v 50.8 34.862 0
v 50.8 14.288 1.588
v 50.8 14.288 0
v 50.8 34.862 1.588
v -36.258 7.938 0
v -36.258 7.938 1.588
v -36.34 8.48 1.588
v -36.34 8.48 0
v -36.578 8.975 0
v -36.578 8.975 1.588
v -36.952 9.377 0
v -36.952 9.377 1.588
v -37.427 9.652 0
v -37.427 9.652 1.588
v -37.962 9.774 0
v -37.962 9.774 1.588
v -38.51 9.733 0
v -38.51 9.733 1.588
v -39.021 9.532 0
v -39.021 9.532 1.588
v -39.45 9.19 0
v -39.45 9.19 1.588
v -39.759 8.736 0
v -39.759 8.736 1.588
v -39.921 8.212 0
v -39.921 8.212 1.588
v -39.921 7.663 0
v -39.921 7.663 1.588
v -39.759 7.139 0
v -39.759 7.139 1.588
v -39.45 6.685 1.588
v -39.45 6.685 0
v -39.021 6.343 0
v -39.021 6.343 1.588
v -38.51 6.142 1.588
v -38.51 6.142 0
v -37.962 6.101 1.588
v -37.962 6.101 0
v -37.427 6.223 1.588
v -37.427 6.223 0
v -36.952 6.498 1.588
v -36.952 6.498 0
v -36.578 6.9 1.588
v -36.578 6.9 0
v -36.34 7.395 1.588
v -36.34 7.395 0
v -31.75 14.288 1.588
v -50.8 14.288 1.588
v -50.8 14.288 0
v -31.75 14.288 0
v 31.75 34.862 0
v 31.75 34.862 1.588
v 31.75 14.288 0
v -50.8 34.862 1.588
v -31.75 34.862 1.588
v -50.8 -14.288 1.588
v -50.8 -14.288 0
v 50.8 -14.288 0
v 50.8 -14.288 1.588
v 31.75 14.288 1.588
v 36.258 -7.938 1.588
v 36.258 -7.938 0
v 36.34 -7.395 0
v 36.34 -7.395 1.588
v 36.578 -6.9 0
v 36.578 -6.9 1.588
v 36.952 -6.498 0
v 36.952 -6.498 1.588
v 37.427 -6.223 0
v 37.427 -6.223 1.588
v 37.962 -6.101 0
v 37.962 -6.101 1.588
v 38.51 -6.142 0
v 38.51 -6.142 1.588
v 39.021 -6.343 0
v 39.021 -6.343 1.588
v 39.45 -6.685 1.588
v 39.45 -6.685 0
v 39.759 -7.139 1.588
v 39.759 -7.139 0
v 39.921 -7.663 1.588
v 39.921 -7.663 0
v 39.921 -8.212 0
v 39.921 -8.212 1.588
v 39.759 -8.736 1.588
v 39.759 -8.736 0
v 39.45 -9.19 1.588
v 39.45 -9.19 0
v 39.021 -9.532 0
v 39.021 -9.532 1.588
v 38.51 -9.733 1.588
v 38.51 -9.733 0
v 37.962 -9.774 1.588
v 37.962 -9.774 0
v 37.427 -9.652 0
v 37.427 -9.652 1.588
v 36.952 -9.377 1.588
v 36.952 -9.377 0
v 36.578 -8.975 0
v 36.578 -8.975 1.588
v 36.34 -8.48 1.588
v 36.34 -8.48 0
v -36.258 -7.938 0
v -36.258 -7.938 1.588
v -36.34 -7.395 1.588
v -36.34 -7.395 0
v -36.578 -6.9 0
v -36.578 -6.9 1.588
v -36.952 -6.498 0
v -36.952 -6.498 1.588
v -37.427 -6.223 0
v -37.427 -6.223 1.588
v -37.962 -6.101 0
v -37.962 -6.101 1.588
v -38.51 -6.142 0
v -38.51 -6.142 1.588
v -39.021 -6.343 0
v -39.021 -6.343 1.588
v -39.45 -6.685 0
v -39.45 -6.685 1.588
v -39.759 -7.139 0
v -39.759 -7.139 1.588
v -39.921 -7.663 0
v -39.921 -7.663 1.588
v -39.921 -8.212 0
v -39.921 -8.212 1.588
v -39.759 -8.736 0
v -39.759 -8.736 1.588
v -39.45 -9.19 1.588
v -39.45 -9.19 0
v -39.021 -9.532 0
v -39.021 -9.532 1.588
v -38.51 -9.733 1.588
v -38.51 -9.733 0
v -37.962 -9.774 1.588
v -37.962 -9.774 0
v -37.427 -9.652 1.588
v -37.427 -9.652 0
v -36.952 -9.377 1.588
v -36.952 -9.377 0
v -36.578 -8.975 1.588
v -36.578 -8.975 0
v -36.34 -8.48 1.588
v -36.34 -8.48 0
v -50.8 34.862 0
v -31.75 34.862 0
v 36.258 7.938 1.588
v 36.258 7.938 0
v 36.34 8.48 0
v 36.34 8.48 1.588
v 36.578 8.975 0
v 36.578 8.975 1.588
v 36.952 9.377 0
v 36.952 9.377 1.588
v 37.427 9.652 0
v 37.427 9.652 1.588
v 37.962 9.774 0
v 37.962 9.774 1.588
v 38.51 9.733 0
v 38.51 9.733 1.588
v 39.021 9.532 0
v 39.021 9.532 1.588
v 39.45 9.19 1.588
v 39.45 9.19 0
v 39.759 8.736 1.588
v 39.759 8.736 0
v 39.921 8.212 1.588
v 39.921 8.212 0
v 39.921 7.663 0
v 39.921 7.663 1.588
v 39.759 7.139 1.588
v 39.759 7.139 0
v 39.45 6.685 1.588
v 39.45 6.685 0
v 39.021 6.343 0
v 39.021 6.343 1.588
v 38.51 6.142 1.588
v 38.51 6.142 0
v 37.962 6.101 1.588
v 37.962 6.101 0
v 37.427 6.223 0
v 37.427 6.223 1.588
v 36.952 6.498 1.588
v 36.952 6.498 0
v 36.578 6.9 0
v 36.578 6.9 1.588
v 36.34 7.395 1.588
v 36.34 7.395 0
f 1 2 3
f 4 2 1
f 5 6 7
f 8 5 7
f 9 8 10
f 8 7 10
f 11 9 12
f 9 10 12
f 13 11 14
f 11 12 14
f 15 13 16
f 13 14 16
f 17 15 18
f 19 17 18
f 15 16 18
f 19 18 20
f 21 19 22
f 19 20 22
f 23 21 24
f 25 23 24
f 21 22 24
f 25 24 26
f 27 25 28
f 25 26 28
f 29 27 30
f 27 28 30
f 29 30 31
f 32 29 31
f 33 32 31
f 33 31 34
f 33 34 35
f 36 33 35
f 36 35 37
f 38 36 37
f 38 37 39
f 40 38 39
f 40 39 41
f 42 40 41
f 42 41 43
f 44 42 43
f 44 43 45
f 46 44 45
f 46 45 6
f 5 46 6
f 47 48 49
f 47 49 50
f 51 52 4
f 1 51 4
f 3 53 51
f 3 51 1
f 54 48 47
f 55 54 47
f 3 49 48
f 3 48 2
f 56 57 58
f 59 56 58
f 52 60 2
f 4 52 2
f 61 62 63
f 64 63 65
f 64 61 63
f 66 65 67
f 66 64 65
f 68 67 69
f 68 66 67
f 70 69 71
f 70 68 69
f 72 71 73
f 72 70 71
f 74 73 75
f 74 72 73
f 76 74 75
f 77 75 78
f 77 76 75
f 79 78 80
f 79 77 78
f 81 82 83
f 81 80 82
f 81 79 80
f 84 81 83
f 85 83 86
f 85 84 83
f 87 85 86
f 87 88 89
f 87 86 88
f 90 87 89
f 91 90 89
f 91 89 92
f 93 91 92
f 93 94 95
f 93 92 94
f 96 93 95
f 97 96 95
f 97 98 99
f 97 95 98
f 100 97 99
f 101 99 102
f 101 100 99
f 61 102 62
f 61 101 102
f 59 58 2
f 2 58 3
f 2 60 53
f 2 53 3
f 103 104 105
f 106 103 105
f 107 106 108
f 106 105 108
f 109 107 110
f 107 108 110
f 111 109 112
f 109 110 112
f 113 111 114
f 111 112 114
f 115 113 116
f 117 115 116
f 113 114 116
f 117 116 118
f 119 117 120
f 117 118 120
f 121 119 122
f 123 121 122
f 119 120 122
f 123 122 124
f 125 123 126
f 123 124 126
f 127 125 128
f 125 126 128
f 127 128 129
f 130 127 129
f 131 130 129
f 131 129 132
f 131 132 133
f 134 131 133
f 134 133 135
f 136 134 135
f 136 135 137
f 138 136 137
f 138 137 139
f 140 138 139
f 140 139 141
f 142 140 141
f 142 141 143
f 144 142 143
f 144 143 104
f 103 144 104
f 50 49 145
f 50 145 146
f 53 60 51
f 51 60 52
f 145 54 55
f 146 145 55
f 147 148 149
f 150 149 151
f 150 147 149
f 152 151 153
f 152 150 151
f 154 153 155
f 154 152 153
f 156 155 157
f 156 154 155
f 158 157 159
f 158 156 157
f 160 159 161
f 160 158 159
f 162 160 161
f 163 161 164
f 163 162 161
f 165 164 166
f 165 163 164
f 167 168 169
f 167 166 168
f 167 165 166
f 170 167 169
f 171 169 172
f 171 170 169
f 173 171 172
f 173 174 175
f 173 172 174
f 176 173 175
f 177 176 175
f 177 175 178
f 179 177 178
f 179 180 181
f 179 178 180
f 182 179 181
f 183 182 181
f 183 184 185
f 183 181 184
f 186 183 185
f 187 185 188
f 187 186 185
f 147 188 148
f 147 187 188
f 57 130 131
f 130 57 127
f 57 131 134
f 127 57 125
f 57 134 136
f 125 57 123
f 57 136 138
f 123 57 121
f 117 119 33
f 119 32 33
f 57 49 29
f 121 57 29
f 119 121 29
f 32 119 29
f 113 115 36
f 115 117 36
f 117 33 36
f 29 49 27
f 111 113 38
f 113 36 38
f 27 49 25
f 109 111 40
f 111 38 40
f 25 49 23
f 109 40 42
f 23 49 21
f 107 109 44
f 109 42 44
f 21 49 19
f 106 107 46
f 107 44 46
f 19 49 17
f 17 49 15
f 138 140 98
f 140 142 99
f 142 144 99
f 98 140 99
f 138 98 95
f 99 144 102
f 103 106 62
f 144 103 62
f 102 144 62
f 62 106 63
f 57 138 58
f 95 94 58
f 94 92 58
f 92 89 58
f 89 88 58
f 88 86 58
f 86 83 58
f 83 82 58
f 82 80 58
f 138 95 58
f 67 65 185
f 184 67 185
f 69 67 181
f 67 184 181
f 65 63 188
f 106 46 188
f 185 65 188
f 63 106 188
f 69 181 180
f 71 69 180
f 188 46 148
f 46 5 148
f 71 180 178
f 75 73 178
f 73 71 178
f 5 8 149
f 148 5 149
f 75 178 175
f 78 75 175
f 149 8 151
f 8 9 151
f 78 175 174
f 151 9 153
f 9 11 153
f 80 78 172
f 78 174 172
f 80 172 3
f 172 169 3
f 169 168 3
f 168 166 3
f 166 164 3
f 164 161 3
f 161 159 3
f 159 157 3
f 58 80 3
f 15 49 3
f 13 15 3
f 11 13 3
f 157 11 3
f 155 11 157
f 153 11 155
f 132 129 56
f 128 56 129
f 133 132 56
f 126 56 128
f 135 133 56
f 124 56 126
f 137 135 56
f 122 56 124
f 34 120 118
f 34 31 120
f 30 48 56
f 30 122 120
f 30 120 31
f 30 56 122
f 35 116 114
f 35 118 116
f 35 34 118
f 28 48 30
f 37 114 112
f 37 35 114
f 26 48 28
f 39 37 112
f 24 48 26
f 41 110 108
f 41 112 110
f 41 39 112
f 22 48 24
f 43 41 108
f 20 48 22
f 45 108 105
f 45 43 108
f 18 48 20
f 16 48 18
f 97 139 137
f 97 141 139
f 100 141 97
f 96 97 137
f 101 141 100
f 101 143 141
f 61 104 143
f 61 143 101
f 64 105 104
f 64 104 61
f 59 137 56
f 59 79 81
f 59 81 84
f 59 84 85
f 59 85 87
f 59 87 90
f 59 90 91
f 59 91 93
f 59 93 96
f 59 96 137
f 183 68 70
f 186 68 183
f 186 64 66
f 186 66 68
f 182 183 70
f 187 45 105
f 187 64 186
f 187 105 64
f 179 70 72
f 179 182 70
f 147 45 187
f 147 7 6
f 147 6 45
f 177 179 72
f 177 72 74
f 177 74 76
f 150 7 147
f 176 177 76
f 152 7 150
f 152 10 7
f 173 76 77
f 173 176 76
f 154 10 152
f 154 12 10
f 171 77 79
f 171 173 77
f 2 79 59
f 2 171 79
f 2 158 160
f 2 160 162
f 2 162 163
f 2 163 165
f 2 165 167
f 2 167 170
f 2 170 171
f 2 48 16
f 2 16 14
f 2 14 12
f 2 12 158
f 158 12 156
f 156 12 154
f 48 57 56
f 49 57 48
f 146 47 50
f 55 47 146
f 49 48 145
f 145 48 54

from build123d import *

# Parameters (mm, degrees)
SKETCH1_W             = 101.6
SKETCH1_H             = 28.575
BOSS_EXTRUDE1_DEPTH   = 1.5875
SKETCH2_R             = 1.8415
CUT_EXTRUDE1_DEPTH    = 53.794818046
SKETCH3_W             = 19.05
SKETCH3_H             = 20.574
BOSS_EXTRUDE2_DEPTH   = 1.5875
BOSS_EXTRUDE2_2_DEPTH = 1.5875


with BuildPart() as part:
    # Sketch1 → Boss-Extrude1 (new body)
    with BuildSketch(Plane.XY):
        Rectangle(SKETCH1_W, SKETCH1_H)
    extrude(amount=BOSS_EXTRUDE1_DEPTH)

    # Sketch2 → Cut-Extrude1 (cut, through all)
    with BuildSketch(Plane.XY.offset(1.5875)):
        with Locations((-38.1, 7.9375)):
            Circle(SKETCH2_R)
        with Locations((-38.1, -7.9375)):
            Circle(SKETCH2_R)
    cut_extrude1 = extrude(amount=-CUT_EXTRUDE1_DEPTH, mode=Mode.SUBTRACT)

    # Mirror1: Cut-Extrude1 across plane
    add(cut_extrude1.mirror(Plane(origin=(0, 0, 0), x_dir=(0, 0, 1), z_dir=(1, 0, 0))), mode=Mode.SUBTRACT)


with BuildPart() as body_2:
    # Sketch3 → Boss-Extrude2 (new body)
    with BuildSketch(Plane.XY.offset(1.5875)):
        with Locations((-41.275, 24.5745)):
            Rectangle(SKETCH3_W, SKETCH3_H)
    extrude(amount=-BOSS_EXTRUDE2_DEPTH)


with BuildPart() as body_3:
    # Sketch3 → Boss-Extrude2 2 (new body)
    with BuildSketch(Plane.XY.offset(1.5875)):
        with Locations((41.275, 24.5745)):
            Rectangle(SKETCH3_W, SKETCH3_H)
    extrude(amount=-BOSS_EXTRUDE2_2_DEPTH)


solid = Compound([part.part, body_2.part, body_3.part])
